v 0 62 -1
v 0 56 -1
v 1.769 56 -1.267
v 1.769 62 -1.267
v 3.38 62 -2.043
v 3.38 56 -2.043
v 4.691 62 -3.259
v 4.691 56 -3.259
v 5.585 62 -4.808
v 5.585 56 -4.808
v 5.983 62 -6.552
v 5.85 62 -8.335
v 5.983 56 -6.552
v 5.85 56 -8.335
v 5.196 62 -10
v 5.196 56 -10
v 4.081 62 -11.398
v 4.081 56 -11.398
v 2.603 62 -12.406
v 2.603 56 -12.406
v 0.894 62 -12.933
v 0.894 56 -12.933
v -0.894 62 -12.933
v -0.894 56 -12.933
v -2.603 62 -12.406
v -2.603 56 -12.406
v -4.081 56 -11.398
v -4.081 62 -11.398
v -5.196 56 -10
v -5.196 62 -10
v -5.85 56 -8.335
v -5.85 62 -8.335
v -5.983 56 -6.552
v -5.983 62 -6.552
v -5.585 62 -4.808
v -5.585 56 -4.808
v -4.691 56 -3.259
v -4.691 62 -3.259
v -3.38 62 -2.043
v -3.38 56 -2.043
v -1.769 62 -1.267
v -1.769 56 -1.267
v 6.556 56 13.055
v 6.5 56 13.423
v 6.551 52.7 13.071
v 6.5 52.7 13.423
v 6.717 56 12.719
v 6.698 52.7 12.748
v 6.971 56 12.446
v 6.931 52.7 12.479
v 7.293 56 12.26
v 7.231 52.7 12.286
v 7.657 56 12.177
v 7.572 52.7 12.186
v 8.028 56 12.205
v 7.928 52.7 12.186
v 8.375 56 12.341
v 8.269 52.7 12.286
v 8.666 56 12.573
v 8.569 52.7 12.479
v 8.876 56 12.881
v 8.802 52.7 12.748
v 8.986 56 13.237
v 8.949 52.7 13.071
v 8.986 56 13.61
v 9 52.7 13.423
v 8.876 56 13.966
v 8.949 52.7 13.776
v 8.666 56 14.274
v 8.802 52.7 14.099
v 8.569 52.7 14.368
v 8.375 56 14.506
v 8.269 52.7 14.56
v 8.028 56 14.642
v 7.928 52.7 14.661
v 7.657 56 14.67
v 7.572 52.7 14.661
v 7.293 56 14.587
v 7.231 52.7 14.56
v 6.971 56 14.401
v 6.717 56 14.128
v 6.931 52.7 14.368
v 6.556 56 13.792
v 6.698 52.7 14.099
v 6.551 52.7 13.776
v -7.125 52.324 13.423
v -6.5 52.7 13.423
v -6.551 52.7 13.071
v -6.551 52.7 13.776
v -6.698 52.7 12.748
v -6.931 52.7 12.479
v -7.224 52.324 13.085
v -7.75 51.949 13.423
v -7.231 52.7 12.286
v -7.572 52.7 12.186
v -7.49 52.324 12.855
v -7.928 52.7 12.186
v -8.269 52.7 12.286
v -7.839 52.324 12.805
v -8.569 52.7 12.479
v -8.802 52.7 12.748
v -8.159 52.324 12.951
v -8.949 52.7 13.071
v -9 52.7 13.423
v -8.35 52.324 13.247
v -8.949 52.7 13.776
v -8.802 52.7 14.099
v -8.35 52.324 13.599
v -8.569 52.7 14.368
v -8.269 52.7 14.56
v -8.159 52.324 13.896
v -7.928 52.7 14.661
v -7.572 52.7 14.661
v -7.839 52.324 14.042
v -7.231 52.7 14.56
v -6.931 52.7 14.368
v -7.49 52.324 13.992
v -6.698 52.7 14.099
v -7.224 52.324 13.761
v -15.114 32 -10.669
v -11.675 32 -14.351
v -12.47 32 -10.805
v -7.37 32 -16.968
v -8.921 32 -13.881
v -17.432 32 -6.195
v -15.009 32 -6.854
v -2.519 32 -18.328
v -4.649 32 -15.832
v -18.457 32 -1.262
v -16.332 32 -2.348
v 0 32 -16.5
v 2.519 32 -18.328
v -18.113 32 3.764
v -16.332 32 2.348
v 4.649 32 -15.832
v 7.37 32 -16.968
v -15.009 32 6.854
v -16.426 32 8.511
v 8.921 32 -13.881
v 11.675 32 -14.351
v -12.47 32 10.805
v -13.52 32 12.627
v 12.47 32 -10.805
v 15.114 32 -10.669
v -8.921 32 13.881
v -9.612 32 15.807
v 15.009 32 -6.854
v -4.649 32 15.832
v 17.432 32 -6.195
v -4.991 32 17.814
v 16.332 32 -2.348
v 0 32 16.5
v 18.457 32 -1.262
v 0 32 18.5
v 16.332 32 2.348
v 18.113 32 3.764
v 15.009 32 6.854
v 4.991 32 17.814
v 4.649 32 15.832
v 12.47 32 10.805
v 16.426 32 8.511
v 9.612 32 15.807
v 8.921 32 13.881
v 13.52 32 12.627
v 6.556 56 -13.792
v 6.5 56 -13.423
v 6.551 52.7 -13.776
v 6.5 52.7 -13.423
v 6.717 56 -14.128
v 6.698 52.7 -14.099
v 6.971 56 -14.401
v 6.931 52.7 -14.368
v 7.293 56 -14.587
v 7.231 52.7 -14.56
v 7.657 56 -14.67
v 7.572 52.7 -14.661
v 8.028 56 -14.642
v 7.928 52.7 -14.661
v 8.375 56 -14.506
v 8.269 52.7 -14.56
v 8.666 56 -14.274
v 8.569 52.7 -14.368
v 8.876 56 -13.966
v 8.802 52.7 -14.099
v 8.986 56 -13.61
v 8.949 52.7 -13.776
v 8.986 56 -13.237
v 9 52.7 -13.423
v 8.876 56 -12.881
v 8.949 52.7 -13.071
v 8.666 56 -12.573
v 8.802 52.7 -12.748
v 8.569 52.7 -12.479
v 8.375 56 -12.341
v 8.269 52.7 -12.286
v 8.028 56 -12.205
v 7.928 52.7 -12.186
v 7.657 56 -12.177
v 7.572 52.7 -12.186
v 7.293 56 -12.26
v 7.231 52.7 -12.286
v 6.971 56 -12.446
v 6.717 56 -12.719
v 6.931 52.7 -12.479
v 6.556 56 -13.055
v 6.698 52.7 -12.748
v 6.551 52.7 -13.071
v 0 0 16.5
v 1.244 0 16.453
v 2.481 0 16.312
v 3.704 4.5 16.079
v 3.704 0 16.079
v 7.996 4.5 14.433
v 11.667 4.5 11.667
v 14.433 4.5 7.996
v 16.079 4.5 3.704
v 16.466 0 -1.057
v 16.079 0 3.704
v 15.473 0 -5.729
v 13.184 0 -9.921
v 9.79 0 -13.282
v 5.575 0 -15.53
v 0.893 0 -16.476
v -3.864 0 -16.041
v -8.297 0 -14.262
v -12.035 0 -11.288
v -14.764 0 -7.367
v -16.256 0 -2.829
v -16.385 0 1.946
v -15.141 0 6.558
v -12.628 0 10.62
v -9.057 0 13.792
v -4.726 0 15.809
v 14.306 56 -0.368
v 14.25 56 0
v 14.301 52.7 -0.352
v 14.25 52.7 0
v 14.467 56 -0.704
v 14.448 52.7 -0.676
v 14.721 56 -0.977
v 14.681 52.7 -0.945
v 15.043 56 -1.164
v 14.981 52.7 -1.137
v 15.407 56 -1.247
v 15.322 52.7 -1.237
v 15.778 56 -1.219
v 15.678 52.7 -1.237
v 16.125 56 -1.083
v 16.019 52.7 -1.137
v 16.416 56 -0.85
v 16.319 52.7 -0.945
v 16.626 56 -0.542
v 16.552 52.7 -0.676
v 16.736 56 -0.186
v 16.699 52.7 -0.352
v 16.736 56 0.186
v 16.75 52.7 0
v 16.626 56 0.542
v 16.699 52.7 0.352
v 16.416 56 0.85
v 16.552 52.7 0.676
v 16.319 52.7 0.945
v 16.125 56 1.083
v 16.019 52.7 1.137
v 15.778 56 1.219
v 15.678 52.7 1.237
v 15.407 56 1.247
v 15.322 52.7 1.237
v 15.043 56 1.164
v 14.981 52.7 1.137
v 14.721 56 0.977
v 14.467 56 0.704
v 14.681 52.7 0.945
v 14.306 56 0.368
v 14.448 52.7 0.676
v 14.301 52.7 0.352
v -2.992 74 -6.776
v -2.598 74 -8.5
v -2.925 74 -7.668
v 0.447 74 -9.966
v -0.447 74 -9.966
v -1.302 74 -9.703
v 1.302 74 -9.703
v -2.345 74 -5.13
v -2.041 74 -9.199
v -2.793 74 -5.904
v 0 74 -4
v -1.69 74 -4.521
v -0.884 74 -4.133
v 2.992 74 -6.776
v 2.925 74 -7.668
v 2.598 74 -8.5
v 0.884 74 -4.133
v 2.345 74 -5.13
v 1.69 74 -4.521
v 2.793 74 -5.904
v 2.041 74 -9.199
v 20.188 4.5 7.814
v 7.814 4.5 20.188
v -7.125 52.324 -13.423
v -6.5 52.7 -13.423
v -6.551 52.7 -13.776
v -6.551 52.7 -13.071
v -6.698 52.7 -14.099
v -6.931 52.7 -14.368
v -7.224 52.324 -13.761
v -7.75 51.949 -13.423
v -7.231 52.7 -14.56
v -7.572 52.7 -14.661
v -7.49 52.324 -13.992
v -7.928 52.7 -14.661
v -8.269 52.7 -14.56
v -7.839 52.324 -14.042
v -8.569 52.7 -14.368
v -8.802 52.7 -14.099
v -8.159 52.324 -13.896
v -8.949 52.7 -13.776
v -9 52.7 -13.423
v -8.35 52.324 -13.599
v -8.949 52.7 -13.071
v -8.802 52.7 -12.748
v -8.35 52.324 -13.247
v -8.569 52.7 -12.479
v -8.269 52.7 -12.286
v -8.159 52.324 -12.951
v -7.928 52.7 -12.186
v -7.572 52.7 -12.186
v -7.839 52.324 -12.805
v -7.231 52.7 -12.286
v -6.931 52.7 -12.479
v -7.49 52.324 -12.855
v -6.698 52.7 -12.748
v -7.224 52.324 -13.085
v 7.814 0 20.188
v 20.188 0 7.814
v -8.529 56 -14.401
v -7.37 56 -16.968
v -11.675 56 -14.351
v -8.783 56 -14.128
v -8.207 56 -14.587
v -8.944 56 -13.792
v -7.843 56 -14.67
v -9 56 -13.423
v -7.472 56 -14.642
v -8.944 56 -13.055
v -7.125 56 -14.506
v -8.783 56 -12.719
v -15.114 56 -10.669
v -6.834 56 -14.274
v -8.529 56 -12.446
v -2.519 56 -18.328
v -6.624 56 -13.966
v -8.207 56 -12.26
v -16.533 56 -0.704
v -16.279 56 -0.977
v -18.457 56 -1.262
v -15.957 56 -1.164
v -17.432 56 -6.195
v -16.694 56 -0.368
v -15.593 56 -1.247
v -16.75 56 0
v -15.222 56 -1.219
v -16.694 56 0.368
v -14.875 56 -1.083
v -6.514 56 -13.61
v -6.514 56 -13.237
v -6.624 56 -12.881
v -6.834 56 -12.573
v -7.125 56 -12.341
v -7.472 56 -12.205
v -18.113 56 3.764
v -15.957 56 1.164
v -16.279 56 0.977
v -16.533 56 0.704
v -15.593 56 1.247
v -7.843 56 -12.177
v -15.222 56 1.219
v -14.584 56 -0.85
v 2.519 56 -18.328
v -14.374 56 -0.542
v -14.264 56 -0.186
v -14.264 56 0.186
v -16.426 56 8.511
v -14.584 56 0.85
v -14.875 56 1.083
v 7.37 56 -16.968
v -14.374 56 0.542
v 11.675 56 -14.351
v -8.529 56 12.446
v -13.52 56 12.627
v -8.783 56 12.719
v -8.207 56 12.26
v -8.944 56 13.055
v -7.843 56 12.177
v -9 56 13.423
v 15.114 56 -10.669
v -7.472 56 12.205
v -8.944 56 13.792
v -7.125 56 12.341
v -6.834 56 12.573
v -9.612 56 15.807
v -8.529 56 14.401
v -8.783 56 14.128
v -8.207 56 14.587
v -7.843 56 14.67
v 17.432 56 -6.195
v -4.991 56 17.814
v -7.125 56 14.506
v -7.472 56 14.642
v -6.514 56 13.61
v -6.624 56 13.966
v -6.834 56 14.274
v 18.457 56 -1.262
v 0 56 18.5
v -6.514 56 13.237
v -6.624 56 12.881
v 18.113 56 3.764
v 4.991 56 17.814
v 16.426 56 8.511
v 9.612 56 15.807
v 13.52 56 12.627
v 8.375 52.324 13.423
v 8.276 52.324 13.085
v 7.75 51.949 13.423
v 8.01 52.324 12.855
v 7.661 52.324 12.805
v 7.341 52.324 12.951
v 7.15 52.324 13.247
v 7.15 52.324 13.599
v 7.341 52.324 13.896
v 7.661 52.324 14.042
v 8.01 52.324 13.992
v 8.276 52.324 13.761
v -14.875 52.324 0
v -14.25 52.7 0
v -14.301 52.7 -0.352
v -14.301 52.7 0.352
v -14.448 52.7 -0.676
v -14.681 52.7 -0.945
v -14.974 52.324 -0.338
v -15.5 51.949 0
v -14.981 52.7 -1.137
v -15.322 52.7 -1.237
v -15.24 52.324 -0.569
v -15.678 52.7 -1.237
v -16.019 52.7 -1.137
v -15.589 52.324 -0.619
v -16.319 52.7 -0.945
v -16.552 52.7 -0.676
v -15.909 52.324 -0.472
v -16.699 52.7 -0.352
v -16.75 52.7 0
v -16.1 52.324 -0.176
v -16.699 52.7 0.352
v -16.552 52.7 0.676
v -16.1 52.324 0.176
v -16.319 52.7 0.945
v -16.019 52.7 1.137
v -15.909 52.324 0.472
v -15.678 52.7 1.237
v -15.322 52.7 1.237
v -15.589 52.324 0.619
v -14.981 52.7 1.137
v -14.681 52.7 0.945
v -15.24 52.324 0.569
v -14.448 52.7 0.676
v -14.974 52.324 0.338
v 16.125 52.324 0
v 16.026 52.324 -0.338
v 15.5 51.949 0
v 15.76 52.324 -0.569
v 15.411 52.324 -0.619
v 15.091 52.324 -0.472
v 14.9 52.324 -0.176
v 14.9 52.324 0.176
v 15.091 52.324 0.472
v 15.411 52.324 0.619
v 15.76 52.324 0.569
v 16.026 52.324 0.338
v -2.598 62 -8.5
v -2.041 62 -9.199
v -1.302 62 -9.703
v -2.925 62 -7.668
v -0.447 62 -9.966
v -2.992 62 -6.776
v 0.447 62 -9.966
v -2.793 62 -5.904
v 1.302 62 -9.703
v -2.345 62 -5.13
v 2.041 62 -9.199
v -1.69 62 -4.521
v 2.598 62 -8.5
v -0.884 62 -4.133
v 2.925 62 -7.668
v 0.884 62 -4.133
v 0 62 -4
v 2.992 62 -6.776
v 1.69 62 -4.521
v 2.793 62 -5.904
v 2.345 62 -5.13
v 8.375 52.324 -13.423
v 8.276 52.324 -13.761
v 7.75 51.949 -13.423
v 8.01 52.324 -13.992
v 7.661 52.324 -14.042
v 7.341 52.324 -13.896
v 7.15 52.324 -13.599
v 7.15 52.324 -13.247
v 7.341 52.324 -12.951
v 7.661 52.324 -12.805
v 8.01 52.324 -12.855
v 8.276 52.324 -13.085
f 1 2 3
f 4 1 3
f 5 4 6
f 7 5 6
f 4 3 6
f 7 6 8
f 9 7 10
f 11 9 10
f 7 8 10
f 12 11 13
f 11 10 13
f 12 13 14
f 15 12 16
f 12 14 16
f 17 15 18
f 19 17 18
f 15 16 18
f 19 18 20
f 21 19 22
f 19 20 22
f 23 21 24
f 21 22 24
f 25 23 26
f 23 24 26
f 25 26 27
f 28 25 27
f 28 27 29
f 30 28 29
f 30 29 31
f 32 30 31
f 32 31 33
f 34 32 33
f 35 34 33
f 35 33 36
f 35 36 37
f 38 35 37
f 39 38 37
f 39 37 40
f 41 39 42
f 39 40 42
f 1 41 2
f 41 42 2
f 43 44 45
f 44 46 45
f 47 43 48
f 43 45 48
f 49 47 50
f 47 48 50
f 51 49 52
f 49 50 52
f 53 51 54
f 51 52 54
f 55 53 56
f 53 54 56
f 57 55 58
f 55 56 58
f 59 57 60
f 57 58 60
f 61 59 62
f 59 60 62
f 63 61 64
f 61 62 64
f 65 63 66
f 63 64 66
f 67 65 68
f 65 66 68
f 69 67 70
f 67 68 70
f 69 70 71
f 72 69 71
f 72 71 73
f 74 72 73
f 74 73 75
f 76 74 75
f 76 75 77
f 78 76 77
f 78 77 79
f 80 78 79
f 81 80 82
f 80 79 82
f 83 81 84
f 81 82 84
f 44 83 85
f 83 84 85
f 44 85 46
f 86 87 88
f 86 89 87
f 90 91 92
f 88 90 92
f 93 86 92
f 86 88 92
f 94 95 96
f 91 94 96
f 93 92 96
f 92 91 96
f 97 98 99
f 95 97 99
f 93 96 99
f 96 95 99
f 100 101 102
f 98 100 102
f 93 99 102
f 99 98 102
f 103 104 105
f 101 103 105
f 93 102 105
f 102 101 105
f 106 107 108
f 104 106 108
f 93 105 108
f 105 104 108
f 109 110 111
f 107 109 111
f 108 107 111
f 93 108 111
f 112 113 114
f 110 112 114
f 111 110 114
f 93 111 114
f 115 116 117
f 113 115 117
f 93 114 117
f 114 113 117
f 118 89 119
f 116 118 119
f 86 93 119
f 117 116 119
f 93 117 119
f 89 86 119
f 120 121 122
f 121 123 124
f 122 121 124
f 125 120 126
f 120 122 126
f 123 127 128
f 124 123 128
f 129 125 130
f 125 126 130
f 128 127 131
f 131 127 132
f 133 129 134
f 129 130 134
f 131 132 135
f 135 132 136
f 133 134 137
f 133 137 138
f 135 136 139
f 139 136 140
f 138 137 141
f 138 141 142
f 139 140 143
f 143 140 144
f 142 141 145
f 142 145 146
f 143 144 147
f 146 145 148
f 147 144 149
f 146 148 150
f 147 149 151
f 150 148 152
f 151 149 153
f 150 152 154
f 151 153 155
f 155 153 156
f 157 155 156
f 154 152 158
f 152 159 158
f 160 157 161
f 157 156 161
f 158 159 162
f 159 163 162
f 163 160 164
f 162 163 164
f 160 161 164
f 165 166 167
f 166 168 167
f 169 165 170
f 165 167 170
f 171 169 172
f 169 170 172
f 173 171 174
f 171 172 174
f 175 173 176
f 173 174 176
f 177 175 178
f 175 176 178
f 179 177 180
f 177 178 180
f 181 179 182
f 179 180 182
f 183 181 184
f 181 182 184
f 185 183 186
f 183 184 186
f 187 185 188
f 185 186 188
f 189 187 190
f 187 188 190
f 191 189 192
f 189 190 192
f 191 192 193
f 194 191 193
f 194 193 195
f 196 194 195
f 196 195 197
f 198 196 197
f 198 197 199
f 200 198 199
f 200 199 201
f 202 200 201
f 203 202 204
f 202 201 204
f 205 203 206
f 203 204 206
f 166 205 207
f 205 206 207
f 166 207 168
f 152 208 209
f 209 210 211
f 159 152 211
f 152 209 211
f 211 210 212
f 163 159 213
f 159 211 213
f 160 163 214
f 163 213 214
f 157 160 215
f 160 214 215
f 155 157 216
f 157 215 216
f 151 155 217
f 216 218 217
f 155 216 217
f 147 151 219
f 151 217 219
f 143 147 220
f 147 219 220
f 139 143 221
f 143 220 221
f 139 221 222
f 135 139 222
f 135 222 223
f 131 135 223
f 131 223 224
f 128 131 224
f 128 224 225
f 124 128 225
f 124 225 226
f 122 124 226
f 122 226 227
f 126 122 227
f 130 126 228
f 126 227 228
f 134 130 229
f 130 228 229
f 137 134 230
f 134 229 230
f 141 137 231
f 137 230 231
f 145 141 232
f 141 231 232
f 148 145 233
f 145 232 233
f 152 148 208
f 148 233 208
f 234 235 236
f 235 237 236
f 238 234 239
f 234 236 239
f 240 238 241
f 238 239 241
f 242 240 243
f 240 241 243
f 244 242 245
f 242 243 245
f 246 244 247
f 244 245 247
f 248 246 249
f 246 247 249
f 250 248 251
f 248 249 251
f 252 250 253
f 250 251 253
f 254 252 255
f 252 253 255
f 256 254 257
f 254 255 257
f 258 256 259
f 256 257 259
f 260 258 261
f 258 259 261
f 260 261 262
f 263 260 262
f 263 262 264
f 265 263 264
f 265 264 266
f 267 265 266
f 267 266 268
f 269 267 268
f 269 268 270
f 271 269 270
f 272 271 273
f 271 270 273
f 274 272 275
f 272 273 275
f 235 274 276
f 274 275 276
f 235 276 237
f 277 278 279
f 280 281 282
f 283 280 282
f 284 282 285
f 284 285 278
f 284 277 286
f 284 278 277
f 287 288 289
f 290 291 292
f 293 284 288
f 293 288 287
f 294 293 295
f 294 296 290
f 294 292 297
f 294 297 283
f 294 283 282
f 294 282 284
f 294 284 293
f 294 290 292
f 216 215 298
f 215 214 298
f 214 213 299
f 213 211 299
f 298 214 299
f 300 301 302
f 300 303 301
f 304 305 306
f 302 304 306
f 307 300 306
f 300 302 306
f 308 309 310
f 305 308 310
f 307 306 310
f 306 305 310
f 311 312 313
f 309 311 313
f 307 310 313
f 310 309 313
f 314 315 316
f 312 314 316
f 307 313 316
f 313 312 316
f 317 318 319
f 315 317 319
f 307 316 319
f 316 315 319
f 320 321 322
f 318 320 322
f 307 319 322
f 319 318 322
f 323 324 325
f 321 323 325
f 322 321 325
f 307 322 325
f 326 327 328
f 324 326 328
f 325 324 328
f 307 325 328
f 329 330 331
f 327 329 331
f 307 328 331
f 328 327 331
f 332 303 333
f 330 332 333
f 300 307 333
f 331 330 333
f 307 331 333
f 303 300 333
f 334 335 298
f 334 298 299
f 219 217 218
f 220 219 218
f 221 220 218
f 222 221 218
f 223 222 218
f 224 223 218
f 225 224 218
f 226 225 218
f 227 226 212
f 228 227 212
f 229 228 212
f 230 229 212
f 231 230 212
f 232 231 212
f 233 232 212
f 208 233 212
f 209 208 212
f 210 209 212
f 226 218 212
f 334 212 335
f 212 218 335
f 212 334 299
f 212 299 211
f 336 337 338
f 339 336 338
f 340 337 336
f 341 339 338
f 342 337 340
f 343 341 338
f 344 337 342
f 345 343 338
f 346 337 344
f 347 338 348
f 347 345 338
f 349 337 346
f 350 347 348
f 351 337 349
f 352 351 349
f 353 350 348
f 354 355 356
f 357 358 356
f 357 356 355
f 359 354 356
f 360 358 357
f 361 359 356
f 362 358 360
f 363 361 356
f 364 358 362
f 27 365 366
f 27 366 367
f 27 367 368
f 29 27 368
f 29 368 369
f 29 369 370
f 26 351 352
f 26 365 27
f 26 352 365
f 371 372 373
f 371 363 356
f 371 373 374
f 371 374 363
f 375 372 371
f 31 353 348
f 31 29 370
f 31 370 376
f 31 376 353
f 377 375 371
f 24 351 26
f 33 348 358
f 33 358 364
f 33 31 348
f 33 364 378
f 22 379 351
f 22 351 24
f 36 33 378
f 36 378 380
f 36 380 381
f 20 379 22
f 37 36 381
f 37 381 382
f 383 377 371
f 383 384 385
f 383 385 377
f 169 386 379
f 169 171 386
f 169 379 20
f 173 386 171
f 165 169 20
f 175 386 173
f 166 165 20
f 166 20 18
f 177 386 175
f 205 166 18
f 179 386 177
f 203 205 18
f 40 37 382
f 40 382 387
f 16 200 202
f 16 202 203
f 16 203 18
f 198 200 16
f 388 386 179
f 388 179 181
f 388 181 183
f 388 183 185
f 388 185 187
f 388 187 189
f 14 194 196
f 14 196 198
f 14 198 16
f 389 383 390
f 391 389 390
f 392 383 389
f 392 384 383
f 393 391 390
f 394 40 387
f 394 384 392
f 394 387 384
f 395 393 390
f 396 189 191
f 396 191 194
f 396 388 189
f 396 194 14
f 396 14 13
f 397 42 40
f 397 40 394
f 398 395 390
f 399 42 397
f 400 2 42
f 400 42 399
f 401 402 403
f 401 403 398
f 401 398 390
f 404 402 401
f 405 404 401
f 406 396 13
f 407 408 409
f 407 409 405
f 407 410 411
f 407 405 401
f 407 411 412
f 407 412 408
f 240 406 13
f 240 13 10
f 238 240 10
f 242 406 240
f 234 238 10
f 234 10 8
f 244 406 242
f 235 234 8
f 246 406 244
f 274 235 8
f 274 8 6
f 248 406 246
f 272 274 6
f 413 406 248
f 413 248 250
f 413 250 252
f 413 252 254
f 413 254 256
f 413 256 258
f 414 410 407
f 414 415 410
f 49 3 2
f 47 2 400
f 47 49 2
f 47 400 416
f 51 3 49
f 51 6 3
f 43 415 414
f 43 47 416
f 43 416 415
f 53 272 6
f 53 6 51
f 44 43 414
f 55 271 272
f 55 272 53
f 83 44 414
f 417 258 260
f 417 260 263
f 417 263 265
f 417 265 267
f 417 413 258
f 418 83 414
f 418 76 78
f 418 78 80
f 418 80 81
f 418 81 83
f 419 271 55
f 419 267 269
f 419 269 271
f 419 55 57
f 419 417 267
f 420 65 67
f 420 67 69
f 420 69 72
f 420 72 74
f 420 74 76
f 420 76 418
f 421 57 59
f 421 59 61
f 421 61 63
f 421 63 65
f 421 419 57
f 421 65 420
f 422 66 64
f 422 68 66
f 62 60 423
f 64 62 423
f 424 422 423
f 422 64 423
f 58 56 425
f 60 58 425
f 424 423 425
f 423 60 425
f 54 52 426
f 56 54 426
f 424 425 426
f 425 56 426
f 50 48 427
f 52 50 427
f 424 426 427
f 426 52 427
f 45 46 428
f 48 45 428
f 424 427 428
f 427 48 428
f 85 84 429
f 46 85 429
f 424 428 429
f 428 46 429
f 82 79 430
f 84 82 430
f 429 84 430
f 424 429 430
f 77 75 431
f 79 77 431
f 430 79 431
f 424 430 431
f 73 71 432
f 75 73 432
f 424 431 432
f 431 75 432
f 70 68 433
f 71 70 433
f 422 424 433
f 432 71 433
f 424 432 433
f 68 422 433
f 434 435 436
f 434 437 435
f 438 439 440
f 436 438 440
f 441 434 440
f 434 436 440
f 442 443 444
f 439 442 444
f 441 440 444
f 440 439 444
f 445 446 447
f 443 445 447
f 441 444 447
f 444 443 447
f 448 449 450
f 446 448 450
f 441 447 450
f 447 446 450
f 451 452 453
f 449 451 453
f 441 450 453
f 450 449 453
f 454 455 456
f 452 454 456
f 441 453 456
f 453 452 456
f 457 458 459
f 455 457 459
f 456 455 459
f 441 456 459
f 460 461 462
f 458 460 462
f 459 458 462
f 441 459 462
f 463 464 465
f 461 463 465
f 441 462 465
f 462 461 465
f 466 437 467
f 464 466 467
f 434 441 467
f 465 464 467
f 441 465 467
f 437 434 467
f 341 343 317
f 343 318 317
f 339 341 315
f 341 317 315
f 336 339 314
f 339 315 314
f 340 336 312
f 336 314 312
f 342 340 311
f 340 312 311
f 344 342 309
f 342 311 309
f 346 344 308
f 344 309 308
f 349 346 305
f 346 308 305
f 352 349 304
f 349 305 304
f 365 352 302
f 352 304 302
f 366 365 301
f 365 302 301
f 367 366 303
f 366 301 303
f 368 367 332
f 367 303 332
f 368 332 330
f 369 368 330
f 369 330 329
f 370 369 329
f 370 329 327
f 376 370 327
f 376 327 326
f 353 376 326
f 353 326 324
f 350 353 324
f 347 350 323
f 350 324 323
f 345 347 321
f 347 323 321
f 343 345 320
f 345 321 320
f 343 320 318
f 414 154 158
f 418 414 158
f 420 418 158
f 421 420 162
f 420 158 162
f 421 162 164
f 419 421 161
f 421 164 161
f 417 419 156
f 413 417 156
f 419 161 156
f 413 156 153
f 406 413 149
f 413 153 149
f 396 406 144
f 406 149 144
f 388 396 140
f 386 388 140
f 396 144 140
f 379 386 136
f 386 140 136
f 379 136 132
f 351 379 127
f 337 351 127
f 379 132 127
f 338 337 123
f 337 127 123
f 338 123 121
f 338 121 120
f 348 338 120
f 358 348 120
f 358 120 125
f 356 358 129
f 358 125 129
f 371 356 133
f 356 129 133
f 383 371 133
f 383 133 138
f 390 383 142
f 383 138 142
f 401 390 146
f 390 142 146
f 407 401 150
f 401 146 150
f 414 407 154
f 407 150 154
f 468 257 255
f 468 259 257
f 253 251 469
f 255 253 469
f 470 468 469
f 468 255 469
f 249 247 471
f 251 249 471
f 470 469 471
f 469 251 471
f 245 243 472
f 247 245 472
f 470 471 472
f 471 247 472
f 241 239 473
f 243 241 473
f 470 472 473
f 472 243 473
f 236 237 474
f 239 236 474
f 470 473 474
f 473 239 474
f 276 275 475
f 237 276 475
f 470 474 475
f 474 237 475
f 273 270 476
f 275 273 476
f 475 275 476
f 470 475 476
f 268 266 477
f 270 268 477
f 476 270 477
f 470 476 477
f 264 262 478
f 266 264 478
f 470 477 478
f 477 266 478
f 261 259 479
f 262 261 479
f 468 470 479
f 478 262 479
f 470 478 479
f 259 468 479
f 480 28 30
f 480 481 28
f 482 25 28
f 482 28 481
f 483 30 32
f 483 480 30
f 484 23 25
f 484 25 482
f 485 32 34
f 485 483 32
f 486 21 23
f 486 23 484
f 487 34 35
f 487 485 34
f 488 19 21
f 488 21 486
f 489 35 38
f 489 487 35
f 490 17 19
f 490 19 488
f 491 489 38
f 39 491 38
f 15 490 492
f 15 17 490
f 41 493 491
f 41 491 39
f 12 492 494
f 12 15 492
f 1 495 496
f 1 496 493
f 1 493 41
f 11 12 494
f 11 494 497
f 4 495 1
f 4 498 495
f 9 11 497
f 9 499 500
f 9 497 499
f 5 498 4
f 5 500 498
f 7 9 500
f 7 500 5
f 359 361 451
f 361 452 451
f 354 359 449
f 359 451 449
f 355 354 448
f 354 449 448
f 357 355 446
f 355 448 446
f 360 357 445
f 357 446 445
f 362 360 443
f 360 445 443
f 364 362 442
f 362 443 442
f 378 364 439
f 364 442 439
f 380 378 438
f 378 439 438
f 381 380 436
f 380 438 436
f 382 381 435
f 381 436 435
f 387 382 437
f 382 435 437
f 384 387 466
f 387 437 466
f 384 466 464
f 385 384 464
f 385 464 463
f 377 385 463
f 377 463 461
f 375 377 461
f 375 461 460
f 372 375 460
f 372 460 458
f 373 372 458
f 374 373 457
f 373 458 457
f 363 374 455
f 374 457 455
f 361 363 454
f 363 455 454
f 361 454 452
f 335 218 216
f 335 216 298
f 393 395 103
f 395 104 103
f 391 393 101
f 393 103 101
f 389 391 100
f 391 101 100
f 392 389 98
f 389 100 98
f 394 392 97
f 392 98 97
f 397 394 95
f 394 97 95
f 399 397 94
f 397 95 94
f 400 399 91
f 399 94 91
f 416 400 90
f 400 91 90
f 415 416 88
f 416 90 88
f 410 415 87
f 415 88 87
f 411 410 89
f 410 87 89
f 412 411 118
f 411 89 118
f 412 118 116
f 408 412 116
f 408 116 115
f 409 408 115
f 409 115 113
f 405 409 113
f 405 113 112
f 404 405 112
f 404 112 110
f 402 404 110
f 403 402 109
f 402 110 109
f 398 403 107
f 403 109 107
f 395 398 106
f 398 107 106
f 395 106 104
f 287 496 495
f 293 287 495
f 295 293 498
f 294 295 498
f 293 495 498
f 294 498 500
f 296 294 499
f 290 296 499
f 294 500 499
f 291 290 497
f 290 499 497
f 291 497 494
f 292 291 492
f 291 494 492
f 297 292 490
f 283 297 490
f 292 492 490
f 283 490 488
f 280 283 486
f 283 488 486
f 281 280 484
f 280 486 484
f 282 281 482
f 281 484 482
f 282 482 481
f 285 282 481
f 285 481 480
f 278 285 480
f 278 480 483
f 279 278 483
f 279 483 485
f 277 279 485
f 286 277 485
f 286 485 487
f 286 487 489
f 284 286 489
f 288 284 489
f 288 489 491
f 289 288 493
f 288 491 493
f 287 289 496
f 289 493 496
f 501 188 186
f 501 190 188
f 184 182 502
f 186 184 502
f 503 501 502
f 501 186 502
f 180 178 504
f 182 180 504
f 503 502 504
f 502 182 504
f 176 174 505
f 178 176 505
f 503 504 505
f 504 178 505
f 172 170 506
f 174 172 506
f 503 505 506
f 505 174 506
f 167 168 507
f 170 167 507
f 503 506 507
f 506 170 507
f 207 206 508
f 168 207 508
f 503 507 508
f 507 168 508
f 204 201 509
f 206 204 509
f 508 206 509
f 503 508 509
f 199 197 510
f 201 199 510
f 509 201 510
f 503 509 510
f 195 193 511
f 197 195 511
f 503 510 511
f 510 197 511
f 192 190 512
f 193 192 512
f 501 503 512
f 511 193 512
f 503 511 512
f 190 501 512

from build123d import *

# Parameters (mm, degrees)
SKETCH_1_R             = 16.5
EXTRUDE_1_DEPTH        = 32
SKETCH_2_R             = 18.5
EXTRUDE_2_DEPTH        = 24
SKETCH_3_R             = 6
EXTRUDE_3_DEPTH        = 6
SKETCH_4_R             = 3
EXTRUDE_4_DEPTH        = 12
HOLE_WIZARD_M3_1_D     = 2.5
HOLE_WIZARD_M3_1_DEPTH = 3.3
HOLE_WIZARD_M3_1_TIP   = 0.751075774
EXTRUDE_5_DEPTH        = 4.5


with BuildPart() as part:
    # 草图1 → 凸台-拉伸1 (new body)
    with BuildSketch(Plane(origin=(0, 0, 0), x_dir=(1, 0, 0), z_dir=(0, 1, 0))):
        with Locations(Location((0, 0, 0), (0, 0, 270))):
            Circle(SKETCH_1_R)
    extrude(amount=EXTRUDE_1_DEPTH)

    # 草图2 → 凸台-拉伸2 (add)
    with BuildSketch(Plane(origin=(0, 32, 0), x_dir=(1, 0, 0), z_dir=(0, 1, 0))):
        with Locations(Location((0, 0, 0), (0, 0, 270))):
            Circle(SKETCH_2_R)
    extrude(amount=EXTRUDE_2_DEPTH)

    # 草图3 → 凸台-拉伸3 (add)
    with BuildSketch(Plane(origin=(0, 56, 0), x_dir=(1, 0, 0), z_dir=(0, 1, 0))):
        with Locations(Location((0, 7, 0), (0, 0, 270))):
            Circle(SKETCH_3_R)
    extrude(amount=EXTRUDE_3_DEPTH)

    # 草图4 → 凸台-拉伸4 (add)
    with BuildSketch(Plane(origin=(0, 62, 0), x_dir=(1, 0, 0), z_dir=(0, 1, 0))):
        with Locations(Location((0, 7, 0), (0, 0, 270))):
            Circle(SKETCH_4_R)
    extrude(amount=EXTRUDE_4_DEPTH)

    # M3 螺纹孔的螺纹孔钻头1
    with Locations(Plane(origin=(0, 56, 0), x_dir=(1, 0, 0), z_dir=(0, 1, 0))):
        with Locations((-7.75, 13.423393759), (7.75, 13.423393759), (15.5, 0), (7.75, -13.423393759), (-7.75, -13.423393759), (-15.5, 0)):
            Hole(HOLE_WIZARD_M3_1_D / 2, depth=HOLE_WIZARD_M3_1_DEPTH)
            with Locations((0, 0, -(HOLE_WIZARD_M3_1_DEPTH + HOLE_WIZARD_M3_1_TIP / 2))):  # 118° drill point
                Cone(0, HOLE_WIZARD_M3_1_D / 2, HOLE_WIZARD_M3_1_TIP, mode=Mode.SUBTRACT)

    # 草图8 → 凸台-拉伸5 (add)
    with BuildSketch(Plane.XZ):
        Polygon((3.704415636, 16.078784307), (16.078784307, 3.704415636), (20.187898603, 7.813529932), (7.813529932, 20.187898603), align=None)
    extrude(amount=-EXTRUDE_5_DEPTH)


solid = part.part
